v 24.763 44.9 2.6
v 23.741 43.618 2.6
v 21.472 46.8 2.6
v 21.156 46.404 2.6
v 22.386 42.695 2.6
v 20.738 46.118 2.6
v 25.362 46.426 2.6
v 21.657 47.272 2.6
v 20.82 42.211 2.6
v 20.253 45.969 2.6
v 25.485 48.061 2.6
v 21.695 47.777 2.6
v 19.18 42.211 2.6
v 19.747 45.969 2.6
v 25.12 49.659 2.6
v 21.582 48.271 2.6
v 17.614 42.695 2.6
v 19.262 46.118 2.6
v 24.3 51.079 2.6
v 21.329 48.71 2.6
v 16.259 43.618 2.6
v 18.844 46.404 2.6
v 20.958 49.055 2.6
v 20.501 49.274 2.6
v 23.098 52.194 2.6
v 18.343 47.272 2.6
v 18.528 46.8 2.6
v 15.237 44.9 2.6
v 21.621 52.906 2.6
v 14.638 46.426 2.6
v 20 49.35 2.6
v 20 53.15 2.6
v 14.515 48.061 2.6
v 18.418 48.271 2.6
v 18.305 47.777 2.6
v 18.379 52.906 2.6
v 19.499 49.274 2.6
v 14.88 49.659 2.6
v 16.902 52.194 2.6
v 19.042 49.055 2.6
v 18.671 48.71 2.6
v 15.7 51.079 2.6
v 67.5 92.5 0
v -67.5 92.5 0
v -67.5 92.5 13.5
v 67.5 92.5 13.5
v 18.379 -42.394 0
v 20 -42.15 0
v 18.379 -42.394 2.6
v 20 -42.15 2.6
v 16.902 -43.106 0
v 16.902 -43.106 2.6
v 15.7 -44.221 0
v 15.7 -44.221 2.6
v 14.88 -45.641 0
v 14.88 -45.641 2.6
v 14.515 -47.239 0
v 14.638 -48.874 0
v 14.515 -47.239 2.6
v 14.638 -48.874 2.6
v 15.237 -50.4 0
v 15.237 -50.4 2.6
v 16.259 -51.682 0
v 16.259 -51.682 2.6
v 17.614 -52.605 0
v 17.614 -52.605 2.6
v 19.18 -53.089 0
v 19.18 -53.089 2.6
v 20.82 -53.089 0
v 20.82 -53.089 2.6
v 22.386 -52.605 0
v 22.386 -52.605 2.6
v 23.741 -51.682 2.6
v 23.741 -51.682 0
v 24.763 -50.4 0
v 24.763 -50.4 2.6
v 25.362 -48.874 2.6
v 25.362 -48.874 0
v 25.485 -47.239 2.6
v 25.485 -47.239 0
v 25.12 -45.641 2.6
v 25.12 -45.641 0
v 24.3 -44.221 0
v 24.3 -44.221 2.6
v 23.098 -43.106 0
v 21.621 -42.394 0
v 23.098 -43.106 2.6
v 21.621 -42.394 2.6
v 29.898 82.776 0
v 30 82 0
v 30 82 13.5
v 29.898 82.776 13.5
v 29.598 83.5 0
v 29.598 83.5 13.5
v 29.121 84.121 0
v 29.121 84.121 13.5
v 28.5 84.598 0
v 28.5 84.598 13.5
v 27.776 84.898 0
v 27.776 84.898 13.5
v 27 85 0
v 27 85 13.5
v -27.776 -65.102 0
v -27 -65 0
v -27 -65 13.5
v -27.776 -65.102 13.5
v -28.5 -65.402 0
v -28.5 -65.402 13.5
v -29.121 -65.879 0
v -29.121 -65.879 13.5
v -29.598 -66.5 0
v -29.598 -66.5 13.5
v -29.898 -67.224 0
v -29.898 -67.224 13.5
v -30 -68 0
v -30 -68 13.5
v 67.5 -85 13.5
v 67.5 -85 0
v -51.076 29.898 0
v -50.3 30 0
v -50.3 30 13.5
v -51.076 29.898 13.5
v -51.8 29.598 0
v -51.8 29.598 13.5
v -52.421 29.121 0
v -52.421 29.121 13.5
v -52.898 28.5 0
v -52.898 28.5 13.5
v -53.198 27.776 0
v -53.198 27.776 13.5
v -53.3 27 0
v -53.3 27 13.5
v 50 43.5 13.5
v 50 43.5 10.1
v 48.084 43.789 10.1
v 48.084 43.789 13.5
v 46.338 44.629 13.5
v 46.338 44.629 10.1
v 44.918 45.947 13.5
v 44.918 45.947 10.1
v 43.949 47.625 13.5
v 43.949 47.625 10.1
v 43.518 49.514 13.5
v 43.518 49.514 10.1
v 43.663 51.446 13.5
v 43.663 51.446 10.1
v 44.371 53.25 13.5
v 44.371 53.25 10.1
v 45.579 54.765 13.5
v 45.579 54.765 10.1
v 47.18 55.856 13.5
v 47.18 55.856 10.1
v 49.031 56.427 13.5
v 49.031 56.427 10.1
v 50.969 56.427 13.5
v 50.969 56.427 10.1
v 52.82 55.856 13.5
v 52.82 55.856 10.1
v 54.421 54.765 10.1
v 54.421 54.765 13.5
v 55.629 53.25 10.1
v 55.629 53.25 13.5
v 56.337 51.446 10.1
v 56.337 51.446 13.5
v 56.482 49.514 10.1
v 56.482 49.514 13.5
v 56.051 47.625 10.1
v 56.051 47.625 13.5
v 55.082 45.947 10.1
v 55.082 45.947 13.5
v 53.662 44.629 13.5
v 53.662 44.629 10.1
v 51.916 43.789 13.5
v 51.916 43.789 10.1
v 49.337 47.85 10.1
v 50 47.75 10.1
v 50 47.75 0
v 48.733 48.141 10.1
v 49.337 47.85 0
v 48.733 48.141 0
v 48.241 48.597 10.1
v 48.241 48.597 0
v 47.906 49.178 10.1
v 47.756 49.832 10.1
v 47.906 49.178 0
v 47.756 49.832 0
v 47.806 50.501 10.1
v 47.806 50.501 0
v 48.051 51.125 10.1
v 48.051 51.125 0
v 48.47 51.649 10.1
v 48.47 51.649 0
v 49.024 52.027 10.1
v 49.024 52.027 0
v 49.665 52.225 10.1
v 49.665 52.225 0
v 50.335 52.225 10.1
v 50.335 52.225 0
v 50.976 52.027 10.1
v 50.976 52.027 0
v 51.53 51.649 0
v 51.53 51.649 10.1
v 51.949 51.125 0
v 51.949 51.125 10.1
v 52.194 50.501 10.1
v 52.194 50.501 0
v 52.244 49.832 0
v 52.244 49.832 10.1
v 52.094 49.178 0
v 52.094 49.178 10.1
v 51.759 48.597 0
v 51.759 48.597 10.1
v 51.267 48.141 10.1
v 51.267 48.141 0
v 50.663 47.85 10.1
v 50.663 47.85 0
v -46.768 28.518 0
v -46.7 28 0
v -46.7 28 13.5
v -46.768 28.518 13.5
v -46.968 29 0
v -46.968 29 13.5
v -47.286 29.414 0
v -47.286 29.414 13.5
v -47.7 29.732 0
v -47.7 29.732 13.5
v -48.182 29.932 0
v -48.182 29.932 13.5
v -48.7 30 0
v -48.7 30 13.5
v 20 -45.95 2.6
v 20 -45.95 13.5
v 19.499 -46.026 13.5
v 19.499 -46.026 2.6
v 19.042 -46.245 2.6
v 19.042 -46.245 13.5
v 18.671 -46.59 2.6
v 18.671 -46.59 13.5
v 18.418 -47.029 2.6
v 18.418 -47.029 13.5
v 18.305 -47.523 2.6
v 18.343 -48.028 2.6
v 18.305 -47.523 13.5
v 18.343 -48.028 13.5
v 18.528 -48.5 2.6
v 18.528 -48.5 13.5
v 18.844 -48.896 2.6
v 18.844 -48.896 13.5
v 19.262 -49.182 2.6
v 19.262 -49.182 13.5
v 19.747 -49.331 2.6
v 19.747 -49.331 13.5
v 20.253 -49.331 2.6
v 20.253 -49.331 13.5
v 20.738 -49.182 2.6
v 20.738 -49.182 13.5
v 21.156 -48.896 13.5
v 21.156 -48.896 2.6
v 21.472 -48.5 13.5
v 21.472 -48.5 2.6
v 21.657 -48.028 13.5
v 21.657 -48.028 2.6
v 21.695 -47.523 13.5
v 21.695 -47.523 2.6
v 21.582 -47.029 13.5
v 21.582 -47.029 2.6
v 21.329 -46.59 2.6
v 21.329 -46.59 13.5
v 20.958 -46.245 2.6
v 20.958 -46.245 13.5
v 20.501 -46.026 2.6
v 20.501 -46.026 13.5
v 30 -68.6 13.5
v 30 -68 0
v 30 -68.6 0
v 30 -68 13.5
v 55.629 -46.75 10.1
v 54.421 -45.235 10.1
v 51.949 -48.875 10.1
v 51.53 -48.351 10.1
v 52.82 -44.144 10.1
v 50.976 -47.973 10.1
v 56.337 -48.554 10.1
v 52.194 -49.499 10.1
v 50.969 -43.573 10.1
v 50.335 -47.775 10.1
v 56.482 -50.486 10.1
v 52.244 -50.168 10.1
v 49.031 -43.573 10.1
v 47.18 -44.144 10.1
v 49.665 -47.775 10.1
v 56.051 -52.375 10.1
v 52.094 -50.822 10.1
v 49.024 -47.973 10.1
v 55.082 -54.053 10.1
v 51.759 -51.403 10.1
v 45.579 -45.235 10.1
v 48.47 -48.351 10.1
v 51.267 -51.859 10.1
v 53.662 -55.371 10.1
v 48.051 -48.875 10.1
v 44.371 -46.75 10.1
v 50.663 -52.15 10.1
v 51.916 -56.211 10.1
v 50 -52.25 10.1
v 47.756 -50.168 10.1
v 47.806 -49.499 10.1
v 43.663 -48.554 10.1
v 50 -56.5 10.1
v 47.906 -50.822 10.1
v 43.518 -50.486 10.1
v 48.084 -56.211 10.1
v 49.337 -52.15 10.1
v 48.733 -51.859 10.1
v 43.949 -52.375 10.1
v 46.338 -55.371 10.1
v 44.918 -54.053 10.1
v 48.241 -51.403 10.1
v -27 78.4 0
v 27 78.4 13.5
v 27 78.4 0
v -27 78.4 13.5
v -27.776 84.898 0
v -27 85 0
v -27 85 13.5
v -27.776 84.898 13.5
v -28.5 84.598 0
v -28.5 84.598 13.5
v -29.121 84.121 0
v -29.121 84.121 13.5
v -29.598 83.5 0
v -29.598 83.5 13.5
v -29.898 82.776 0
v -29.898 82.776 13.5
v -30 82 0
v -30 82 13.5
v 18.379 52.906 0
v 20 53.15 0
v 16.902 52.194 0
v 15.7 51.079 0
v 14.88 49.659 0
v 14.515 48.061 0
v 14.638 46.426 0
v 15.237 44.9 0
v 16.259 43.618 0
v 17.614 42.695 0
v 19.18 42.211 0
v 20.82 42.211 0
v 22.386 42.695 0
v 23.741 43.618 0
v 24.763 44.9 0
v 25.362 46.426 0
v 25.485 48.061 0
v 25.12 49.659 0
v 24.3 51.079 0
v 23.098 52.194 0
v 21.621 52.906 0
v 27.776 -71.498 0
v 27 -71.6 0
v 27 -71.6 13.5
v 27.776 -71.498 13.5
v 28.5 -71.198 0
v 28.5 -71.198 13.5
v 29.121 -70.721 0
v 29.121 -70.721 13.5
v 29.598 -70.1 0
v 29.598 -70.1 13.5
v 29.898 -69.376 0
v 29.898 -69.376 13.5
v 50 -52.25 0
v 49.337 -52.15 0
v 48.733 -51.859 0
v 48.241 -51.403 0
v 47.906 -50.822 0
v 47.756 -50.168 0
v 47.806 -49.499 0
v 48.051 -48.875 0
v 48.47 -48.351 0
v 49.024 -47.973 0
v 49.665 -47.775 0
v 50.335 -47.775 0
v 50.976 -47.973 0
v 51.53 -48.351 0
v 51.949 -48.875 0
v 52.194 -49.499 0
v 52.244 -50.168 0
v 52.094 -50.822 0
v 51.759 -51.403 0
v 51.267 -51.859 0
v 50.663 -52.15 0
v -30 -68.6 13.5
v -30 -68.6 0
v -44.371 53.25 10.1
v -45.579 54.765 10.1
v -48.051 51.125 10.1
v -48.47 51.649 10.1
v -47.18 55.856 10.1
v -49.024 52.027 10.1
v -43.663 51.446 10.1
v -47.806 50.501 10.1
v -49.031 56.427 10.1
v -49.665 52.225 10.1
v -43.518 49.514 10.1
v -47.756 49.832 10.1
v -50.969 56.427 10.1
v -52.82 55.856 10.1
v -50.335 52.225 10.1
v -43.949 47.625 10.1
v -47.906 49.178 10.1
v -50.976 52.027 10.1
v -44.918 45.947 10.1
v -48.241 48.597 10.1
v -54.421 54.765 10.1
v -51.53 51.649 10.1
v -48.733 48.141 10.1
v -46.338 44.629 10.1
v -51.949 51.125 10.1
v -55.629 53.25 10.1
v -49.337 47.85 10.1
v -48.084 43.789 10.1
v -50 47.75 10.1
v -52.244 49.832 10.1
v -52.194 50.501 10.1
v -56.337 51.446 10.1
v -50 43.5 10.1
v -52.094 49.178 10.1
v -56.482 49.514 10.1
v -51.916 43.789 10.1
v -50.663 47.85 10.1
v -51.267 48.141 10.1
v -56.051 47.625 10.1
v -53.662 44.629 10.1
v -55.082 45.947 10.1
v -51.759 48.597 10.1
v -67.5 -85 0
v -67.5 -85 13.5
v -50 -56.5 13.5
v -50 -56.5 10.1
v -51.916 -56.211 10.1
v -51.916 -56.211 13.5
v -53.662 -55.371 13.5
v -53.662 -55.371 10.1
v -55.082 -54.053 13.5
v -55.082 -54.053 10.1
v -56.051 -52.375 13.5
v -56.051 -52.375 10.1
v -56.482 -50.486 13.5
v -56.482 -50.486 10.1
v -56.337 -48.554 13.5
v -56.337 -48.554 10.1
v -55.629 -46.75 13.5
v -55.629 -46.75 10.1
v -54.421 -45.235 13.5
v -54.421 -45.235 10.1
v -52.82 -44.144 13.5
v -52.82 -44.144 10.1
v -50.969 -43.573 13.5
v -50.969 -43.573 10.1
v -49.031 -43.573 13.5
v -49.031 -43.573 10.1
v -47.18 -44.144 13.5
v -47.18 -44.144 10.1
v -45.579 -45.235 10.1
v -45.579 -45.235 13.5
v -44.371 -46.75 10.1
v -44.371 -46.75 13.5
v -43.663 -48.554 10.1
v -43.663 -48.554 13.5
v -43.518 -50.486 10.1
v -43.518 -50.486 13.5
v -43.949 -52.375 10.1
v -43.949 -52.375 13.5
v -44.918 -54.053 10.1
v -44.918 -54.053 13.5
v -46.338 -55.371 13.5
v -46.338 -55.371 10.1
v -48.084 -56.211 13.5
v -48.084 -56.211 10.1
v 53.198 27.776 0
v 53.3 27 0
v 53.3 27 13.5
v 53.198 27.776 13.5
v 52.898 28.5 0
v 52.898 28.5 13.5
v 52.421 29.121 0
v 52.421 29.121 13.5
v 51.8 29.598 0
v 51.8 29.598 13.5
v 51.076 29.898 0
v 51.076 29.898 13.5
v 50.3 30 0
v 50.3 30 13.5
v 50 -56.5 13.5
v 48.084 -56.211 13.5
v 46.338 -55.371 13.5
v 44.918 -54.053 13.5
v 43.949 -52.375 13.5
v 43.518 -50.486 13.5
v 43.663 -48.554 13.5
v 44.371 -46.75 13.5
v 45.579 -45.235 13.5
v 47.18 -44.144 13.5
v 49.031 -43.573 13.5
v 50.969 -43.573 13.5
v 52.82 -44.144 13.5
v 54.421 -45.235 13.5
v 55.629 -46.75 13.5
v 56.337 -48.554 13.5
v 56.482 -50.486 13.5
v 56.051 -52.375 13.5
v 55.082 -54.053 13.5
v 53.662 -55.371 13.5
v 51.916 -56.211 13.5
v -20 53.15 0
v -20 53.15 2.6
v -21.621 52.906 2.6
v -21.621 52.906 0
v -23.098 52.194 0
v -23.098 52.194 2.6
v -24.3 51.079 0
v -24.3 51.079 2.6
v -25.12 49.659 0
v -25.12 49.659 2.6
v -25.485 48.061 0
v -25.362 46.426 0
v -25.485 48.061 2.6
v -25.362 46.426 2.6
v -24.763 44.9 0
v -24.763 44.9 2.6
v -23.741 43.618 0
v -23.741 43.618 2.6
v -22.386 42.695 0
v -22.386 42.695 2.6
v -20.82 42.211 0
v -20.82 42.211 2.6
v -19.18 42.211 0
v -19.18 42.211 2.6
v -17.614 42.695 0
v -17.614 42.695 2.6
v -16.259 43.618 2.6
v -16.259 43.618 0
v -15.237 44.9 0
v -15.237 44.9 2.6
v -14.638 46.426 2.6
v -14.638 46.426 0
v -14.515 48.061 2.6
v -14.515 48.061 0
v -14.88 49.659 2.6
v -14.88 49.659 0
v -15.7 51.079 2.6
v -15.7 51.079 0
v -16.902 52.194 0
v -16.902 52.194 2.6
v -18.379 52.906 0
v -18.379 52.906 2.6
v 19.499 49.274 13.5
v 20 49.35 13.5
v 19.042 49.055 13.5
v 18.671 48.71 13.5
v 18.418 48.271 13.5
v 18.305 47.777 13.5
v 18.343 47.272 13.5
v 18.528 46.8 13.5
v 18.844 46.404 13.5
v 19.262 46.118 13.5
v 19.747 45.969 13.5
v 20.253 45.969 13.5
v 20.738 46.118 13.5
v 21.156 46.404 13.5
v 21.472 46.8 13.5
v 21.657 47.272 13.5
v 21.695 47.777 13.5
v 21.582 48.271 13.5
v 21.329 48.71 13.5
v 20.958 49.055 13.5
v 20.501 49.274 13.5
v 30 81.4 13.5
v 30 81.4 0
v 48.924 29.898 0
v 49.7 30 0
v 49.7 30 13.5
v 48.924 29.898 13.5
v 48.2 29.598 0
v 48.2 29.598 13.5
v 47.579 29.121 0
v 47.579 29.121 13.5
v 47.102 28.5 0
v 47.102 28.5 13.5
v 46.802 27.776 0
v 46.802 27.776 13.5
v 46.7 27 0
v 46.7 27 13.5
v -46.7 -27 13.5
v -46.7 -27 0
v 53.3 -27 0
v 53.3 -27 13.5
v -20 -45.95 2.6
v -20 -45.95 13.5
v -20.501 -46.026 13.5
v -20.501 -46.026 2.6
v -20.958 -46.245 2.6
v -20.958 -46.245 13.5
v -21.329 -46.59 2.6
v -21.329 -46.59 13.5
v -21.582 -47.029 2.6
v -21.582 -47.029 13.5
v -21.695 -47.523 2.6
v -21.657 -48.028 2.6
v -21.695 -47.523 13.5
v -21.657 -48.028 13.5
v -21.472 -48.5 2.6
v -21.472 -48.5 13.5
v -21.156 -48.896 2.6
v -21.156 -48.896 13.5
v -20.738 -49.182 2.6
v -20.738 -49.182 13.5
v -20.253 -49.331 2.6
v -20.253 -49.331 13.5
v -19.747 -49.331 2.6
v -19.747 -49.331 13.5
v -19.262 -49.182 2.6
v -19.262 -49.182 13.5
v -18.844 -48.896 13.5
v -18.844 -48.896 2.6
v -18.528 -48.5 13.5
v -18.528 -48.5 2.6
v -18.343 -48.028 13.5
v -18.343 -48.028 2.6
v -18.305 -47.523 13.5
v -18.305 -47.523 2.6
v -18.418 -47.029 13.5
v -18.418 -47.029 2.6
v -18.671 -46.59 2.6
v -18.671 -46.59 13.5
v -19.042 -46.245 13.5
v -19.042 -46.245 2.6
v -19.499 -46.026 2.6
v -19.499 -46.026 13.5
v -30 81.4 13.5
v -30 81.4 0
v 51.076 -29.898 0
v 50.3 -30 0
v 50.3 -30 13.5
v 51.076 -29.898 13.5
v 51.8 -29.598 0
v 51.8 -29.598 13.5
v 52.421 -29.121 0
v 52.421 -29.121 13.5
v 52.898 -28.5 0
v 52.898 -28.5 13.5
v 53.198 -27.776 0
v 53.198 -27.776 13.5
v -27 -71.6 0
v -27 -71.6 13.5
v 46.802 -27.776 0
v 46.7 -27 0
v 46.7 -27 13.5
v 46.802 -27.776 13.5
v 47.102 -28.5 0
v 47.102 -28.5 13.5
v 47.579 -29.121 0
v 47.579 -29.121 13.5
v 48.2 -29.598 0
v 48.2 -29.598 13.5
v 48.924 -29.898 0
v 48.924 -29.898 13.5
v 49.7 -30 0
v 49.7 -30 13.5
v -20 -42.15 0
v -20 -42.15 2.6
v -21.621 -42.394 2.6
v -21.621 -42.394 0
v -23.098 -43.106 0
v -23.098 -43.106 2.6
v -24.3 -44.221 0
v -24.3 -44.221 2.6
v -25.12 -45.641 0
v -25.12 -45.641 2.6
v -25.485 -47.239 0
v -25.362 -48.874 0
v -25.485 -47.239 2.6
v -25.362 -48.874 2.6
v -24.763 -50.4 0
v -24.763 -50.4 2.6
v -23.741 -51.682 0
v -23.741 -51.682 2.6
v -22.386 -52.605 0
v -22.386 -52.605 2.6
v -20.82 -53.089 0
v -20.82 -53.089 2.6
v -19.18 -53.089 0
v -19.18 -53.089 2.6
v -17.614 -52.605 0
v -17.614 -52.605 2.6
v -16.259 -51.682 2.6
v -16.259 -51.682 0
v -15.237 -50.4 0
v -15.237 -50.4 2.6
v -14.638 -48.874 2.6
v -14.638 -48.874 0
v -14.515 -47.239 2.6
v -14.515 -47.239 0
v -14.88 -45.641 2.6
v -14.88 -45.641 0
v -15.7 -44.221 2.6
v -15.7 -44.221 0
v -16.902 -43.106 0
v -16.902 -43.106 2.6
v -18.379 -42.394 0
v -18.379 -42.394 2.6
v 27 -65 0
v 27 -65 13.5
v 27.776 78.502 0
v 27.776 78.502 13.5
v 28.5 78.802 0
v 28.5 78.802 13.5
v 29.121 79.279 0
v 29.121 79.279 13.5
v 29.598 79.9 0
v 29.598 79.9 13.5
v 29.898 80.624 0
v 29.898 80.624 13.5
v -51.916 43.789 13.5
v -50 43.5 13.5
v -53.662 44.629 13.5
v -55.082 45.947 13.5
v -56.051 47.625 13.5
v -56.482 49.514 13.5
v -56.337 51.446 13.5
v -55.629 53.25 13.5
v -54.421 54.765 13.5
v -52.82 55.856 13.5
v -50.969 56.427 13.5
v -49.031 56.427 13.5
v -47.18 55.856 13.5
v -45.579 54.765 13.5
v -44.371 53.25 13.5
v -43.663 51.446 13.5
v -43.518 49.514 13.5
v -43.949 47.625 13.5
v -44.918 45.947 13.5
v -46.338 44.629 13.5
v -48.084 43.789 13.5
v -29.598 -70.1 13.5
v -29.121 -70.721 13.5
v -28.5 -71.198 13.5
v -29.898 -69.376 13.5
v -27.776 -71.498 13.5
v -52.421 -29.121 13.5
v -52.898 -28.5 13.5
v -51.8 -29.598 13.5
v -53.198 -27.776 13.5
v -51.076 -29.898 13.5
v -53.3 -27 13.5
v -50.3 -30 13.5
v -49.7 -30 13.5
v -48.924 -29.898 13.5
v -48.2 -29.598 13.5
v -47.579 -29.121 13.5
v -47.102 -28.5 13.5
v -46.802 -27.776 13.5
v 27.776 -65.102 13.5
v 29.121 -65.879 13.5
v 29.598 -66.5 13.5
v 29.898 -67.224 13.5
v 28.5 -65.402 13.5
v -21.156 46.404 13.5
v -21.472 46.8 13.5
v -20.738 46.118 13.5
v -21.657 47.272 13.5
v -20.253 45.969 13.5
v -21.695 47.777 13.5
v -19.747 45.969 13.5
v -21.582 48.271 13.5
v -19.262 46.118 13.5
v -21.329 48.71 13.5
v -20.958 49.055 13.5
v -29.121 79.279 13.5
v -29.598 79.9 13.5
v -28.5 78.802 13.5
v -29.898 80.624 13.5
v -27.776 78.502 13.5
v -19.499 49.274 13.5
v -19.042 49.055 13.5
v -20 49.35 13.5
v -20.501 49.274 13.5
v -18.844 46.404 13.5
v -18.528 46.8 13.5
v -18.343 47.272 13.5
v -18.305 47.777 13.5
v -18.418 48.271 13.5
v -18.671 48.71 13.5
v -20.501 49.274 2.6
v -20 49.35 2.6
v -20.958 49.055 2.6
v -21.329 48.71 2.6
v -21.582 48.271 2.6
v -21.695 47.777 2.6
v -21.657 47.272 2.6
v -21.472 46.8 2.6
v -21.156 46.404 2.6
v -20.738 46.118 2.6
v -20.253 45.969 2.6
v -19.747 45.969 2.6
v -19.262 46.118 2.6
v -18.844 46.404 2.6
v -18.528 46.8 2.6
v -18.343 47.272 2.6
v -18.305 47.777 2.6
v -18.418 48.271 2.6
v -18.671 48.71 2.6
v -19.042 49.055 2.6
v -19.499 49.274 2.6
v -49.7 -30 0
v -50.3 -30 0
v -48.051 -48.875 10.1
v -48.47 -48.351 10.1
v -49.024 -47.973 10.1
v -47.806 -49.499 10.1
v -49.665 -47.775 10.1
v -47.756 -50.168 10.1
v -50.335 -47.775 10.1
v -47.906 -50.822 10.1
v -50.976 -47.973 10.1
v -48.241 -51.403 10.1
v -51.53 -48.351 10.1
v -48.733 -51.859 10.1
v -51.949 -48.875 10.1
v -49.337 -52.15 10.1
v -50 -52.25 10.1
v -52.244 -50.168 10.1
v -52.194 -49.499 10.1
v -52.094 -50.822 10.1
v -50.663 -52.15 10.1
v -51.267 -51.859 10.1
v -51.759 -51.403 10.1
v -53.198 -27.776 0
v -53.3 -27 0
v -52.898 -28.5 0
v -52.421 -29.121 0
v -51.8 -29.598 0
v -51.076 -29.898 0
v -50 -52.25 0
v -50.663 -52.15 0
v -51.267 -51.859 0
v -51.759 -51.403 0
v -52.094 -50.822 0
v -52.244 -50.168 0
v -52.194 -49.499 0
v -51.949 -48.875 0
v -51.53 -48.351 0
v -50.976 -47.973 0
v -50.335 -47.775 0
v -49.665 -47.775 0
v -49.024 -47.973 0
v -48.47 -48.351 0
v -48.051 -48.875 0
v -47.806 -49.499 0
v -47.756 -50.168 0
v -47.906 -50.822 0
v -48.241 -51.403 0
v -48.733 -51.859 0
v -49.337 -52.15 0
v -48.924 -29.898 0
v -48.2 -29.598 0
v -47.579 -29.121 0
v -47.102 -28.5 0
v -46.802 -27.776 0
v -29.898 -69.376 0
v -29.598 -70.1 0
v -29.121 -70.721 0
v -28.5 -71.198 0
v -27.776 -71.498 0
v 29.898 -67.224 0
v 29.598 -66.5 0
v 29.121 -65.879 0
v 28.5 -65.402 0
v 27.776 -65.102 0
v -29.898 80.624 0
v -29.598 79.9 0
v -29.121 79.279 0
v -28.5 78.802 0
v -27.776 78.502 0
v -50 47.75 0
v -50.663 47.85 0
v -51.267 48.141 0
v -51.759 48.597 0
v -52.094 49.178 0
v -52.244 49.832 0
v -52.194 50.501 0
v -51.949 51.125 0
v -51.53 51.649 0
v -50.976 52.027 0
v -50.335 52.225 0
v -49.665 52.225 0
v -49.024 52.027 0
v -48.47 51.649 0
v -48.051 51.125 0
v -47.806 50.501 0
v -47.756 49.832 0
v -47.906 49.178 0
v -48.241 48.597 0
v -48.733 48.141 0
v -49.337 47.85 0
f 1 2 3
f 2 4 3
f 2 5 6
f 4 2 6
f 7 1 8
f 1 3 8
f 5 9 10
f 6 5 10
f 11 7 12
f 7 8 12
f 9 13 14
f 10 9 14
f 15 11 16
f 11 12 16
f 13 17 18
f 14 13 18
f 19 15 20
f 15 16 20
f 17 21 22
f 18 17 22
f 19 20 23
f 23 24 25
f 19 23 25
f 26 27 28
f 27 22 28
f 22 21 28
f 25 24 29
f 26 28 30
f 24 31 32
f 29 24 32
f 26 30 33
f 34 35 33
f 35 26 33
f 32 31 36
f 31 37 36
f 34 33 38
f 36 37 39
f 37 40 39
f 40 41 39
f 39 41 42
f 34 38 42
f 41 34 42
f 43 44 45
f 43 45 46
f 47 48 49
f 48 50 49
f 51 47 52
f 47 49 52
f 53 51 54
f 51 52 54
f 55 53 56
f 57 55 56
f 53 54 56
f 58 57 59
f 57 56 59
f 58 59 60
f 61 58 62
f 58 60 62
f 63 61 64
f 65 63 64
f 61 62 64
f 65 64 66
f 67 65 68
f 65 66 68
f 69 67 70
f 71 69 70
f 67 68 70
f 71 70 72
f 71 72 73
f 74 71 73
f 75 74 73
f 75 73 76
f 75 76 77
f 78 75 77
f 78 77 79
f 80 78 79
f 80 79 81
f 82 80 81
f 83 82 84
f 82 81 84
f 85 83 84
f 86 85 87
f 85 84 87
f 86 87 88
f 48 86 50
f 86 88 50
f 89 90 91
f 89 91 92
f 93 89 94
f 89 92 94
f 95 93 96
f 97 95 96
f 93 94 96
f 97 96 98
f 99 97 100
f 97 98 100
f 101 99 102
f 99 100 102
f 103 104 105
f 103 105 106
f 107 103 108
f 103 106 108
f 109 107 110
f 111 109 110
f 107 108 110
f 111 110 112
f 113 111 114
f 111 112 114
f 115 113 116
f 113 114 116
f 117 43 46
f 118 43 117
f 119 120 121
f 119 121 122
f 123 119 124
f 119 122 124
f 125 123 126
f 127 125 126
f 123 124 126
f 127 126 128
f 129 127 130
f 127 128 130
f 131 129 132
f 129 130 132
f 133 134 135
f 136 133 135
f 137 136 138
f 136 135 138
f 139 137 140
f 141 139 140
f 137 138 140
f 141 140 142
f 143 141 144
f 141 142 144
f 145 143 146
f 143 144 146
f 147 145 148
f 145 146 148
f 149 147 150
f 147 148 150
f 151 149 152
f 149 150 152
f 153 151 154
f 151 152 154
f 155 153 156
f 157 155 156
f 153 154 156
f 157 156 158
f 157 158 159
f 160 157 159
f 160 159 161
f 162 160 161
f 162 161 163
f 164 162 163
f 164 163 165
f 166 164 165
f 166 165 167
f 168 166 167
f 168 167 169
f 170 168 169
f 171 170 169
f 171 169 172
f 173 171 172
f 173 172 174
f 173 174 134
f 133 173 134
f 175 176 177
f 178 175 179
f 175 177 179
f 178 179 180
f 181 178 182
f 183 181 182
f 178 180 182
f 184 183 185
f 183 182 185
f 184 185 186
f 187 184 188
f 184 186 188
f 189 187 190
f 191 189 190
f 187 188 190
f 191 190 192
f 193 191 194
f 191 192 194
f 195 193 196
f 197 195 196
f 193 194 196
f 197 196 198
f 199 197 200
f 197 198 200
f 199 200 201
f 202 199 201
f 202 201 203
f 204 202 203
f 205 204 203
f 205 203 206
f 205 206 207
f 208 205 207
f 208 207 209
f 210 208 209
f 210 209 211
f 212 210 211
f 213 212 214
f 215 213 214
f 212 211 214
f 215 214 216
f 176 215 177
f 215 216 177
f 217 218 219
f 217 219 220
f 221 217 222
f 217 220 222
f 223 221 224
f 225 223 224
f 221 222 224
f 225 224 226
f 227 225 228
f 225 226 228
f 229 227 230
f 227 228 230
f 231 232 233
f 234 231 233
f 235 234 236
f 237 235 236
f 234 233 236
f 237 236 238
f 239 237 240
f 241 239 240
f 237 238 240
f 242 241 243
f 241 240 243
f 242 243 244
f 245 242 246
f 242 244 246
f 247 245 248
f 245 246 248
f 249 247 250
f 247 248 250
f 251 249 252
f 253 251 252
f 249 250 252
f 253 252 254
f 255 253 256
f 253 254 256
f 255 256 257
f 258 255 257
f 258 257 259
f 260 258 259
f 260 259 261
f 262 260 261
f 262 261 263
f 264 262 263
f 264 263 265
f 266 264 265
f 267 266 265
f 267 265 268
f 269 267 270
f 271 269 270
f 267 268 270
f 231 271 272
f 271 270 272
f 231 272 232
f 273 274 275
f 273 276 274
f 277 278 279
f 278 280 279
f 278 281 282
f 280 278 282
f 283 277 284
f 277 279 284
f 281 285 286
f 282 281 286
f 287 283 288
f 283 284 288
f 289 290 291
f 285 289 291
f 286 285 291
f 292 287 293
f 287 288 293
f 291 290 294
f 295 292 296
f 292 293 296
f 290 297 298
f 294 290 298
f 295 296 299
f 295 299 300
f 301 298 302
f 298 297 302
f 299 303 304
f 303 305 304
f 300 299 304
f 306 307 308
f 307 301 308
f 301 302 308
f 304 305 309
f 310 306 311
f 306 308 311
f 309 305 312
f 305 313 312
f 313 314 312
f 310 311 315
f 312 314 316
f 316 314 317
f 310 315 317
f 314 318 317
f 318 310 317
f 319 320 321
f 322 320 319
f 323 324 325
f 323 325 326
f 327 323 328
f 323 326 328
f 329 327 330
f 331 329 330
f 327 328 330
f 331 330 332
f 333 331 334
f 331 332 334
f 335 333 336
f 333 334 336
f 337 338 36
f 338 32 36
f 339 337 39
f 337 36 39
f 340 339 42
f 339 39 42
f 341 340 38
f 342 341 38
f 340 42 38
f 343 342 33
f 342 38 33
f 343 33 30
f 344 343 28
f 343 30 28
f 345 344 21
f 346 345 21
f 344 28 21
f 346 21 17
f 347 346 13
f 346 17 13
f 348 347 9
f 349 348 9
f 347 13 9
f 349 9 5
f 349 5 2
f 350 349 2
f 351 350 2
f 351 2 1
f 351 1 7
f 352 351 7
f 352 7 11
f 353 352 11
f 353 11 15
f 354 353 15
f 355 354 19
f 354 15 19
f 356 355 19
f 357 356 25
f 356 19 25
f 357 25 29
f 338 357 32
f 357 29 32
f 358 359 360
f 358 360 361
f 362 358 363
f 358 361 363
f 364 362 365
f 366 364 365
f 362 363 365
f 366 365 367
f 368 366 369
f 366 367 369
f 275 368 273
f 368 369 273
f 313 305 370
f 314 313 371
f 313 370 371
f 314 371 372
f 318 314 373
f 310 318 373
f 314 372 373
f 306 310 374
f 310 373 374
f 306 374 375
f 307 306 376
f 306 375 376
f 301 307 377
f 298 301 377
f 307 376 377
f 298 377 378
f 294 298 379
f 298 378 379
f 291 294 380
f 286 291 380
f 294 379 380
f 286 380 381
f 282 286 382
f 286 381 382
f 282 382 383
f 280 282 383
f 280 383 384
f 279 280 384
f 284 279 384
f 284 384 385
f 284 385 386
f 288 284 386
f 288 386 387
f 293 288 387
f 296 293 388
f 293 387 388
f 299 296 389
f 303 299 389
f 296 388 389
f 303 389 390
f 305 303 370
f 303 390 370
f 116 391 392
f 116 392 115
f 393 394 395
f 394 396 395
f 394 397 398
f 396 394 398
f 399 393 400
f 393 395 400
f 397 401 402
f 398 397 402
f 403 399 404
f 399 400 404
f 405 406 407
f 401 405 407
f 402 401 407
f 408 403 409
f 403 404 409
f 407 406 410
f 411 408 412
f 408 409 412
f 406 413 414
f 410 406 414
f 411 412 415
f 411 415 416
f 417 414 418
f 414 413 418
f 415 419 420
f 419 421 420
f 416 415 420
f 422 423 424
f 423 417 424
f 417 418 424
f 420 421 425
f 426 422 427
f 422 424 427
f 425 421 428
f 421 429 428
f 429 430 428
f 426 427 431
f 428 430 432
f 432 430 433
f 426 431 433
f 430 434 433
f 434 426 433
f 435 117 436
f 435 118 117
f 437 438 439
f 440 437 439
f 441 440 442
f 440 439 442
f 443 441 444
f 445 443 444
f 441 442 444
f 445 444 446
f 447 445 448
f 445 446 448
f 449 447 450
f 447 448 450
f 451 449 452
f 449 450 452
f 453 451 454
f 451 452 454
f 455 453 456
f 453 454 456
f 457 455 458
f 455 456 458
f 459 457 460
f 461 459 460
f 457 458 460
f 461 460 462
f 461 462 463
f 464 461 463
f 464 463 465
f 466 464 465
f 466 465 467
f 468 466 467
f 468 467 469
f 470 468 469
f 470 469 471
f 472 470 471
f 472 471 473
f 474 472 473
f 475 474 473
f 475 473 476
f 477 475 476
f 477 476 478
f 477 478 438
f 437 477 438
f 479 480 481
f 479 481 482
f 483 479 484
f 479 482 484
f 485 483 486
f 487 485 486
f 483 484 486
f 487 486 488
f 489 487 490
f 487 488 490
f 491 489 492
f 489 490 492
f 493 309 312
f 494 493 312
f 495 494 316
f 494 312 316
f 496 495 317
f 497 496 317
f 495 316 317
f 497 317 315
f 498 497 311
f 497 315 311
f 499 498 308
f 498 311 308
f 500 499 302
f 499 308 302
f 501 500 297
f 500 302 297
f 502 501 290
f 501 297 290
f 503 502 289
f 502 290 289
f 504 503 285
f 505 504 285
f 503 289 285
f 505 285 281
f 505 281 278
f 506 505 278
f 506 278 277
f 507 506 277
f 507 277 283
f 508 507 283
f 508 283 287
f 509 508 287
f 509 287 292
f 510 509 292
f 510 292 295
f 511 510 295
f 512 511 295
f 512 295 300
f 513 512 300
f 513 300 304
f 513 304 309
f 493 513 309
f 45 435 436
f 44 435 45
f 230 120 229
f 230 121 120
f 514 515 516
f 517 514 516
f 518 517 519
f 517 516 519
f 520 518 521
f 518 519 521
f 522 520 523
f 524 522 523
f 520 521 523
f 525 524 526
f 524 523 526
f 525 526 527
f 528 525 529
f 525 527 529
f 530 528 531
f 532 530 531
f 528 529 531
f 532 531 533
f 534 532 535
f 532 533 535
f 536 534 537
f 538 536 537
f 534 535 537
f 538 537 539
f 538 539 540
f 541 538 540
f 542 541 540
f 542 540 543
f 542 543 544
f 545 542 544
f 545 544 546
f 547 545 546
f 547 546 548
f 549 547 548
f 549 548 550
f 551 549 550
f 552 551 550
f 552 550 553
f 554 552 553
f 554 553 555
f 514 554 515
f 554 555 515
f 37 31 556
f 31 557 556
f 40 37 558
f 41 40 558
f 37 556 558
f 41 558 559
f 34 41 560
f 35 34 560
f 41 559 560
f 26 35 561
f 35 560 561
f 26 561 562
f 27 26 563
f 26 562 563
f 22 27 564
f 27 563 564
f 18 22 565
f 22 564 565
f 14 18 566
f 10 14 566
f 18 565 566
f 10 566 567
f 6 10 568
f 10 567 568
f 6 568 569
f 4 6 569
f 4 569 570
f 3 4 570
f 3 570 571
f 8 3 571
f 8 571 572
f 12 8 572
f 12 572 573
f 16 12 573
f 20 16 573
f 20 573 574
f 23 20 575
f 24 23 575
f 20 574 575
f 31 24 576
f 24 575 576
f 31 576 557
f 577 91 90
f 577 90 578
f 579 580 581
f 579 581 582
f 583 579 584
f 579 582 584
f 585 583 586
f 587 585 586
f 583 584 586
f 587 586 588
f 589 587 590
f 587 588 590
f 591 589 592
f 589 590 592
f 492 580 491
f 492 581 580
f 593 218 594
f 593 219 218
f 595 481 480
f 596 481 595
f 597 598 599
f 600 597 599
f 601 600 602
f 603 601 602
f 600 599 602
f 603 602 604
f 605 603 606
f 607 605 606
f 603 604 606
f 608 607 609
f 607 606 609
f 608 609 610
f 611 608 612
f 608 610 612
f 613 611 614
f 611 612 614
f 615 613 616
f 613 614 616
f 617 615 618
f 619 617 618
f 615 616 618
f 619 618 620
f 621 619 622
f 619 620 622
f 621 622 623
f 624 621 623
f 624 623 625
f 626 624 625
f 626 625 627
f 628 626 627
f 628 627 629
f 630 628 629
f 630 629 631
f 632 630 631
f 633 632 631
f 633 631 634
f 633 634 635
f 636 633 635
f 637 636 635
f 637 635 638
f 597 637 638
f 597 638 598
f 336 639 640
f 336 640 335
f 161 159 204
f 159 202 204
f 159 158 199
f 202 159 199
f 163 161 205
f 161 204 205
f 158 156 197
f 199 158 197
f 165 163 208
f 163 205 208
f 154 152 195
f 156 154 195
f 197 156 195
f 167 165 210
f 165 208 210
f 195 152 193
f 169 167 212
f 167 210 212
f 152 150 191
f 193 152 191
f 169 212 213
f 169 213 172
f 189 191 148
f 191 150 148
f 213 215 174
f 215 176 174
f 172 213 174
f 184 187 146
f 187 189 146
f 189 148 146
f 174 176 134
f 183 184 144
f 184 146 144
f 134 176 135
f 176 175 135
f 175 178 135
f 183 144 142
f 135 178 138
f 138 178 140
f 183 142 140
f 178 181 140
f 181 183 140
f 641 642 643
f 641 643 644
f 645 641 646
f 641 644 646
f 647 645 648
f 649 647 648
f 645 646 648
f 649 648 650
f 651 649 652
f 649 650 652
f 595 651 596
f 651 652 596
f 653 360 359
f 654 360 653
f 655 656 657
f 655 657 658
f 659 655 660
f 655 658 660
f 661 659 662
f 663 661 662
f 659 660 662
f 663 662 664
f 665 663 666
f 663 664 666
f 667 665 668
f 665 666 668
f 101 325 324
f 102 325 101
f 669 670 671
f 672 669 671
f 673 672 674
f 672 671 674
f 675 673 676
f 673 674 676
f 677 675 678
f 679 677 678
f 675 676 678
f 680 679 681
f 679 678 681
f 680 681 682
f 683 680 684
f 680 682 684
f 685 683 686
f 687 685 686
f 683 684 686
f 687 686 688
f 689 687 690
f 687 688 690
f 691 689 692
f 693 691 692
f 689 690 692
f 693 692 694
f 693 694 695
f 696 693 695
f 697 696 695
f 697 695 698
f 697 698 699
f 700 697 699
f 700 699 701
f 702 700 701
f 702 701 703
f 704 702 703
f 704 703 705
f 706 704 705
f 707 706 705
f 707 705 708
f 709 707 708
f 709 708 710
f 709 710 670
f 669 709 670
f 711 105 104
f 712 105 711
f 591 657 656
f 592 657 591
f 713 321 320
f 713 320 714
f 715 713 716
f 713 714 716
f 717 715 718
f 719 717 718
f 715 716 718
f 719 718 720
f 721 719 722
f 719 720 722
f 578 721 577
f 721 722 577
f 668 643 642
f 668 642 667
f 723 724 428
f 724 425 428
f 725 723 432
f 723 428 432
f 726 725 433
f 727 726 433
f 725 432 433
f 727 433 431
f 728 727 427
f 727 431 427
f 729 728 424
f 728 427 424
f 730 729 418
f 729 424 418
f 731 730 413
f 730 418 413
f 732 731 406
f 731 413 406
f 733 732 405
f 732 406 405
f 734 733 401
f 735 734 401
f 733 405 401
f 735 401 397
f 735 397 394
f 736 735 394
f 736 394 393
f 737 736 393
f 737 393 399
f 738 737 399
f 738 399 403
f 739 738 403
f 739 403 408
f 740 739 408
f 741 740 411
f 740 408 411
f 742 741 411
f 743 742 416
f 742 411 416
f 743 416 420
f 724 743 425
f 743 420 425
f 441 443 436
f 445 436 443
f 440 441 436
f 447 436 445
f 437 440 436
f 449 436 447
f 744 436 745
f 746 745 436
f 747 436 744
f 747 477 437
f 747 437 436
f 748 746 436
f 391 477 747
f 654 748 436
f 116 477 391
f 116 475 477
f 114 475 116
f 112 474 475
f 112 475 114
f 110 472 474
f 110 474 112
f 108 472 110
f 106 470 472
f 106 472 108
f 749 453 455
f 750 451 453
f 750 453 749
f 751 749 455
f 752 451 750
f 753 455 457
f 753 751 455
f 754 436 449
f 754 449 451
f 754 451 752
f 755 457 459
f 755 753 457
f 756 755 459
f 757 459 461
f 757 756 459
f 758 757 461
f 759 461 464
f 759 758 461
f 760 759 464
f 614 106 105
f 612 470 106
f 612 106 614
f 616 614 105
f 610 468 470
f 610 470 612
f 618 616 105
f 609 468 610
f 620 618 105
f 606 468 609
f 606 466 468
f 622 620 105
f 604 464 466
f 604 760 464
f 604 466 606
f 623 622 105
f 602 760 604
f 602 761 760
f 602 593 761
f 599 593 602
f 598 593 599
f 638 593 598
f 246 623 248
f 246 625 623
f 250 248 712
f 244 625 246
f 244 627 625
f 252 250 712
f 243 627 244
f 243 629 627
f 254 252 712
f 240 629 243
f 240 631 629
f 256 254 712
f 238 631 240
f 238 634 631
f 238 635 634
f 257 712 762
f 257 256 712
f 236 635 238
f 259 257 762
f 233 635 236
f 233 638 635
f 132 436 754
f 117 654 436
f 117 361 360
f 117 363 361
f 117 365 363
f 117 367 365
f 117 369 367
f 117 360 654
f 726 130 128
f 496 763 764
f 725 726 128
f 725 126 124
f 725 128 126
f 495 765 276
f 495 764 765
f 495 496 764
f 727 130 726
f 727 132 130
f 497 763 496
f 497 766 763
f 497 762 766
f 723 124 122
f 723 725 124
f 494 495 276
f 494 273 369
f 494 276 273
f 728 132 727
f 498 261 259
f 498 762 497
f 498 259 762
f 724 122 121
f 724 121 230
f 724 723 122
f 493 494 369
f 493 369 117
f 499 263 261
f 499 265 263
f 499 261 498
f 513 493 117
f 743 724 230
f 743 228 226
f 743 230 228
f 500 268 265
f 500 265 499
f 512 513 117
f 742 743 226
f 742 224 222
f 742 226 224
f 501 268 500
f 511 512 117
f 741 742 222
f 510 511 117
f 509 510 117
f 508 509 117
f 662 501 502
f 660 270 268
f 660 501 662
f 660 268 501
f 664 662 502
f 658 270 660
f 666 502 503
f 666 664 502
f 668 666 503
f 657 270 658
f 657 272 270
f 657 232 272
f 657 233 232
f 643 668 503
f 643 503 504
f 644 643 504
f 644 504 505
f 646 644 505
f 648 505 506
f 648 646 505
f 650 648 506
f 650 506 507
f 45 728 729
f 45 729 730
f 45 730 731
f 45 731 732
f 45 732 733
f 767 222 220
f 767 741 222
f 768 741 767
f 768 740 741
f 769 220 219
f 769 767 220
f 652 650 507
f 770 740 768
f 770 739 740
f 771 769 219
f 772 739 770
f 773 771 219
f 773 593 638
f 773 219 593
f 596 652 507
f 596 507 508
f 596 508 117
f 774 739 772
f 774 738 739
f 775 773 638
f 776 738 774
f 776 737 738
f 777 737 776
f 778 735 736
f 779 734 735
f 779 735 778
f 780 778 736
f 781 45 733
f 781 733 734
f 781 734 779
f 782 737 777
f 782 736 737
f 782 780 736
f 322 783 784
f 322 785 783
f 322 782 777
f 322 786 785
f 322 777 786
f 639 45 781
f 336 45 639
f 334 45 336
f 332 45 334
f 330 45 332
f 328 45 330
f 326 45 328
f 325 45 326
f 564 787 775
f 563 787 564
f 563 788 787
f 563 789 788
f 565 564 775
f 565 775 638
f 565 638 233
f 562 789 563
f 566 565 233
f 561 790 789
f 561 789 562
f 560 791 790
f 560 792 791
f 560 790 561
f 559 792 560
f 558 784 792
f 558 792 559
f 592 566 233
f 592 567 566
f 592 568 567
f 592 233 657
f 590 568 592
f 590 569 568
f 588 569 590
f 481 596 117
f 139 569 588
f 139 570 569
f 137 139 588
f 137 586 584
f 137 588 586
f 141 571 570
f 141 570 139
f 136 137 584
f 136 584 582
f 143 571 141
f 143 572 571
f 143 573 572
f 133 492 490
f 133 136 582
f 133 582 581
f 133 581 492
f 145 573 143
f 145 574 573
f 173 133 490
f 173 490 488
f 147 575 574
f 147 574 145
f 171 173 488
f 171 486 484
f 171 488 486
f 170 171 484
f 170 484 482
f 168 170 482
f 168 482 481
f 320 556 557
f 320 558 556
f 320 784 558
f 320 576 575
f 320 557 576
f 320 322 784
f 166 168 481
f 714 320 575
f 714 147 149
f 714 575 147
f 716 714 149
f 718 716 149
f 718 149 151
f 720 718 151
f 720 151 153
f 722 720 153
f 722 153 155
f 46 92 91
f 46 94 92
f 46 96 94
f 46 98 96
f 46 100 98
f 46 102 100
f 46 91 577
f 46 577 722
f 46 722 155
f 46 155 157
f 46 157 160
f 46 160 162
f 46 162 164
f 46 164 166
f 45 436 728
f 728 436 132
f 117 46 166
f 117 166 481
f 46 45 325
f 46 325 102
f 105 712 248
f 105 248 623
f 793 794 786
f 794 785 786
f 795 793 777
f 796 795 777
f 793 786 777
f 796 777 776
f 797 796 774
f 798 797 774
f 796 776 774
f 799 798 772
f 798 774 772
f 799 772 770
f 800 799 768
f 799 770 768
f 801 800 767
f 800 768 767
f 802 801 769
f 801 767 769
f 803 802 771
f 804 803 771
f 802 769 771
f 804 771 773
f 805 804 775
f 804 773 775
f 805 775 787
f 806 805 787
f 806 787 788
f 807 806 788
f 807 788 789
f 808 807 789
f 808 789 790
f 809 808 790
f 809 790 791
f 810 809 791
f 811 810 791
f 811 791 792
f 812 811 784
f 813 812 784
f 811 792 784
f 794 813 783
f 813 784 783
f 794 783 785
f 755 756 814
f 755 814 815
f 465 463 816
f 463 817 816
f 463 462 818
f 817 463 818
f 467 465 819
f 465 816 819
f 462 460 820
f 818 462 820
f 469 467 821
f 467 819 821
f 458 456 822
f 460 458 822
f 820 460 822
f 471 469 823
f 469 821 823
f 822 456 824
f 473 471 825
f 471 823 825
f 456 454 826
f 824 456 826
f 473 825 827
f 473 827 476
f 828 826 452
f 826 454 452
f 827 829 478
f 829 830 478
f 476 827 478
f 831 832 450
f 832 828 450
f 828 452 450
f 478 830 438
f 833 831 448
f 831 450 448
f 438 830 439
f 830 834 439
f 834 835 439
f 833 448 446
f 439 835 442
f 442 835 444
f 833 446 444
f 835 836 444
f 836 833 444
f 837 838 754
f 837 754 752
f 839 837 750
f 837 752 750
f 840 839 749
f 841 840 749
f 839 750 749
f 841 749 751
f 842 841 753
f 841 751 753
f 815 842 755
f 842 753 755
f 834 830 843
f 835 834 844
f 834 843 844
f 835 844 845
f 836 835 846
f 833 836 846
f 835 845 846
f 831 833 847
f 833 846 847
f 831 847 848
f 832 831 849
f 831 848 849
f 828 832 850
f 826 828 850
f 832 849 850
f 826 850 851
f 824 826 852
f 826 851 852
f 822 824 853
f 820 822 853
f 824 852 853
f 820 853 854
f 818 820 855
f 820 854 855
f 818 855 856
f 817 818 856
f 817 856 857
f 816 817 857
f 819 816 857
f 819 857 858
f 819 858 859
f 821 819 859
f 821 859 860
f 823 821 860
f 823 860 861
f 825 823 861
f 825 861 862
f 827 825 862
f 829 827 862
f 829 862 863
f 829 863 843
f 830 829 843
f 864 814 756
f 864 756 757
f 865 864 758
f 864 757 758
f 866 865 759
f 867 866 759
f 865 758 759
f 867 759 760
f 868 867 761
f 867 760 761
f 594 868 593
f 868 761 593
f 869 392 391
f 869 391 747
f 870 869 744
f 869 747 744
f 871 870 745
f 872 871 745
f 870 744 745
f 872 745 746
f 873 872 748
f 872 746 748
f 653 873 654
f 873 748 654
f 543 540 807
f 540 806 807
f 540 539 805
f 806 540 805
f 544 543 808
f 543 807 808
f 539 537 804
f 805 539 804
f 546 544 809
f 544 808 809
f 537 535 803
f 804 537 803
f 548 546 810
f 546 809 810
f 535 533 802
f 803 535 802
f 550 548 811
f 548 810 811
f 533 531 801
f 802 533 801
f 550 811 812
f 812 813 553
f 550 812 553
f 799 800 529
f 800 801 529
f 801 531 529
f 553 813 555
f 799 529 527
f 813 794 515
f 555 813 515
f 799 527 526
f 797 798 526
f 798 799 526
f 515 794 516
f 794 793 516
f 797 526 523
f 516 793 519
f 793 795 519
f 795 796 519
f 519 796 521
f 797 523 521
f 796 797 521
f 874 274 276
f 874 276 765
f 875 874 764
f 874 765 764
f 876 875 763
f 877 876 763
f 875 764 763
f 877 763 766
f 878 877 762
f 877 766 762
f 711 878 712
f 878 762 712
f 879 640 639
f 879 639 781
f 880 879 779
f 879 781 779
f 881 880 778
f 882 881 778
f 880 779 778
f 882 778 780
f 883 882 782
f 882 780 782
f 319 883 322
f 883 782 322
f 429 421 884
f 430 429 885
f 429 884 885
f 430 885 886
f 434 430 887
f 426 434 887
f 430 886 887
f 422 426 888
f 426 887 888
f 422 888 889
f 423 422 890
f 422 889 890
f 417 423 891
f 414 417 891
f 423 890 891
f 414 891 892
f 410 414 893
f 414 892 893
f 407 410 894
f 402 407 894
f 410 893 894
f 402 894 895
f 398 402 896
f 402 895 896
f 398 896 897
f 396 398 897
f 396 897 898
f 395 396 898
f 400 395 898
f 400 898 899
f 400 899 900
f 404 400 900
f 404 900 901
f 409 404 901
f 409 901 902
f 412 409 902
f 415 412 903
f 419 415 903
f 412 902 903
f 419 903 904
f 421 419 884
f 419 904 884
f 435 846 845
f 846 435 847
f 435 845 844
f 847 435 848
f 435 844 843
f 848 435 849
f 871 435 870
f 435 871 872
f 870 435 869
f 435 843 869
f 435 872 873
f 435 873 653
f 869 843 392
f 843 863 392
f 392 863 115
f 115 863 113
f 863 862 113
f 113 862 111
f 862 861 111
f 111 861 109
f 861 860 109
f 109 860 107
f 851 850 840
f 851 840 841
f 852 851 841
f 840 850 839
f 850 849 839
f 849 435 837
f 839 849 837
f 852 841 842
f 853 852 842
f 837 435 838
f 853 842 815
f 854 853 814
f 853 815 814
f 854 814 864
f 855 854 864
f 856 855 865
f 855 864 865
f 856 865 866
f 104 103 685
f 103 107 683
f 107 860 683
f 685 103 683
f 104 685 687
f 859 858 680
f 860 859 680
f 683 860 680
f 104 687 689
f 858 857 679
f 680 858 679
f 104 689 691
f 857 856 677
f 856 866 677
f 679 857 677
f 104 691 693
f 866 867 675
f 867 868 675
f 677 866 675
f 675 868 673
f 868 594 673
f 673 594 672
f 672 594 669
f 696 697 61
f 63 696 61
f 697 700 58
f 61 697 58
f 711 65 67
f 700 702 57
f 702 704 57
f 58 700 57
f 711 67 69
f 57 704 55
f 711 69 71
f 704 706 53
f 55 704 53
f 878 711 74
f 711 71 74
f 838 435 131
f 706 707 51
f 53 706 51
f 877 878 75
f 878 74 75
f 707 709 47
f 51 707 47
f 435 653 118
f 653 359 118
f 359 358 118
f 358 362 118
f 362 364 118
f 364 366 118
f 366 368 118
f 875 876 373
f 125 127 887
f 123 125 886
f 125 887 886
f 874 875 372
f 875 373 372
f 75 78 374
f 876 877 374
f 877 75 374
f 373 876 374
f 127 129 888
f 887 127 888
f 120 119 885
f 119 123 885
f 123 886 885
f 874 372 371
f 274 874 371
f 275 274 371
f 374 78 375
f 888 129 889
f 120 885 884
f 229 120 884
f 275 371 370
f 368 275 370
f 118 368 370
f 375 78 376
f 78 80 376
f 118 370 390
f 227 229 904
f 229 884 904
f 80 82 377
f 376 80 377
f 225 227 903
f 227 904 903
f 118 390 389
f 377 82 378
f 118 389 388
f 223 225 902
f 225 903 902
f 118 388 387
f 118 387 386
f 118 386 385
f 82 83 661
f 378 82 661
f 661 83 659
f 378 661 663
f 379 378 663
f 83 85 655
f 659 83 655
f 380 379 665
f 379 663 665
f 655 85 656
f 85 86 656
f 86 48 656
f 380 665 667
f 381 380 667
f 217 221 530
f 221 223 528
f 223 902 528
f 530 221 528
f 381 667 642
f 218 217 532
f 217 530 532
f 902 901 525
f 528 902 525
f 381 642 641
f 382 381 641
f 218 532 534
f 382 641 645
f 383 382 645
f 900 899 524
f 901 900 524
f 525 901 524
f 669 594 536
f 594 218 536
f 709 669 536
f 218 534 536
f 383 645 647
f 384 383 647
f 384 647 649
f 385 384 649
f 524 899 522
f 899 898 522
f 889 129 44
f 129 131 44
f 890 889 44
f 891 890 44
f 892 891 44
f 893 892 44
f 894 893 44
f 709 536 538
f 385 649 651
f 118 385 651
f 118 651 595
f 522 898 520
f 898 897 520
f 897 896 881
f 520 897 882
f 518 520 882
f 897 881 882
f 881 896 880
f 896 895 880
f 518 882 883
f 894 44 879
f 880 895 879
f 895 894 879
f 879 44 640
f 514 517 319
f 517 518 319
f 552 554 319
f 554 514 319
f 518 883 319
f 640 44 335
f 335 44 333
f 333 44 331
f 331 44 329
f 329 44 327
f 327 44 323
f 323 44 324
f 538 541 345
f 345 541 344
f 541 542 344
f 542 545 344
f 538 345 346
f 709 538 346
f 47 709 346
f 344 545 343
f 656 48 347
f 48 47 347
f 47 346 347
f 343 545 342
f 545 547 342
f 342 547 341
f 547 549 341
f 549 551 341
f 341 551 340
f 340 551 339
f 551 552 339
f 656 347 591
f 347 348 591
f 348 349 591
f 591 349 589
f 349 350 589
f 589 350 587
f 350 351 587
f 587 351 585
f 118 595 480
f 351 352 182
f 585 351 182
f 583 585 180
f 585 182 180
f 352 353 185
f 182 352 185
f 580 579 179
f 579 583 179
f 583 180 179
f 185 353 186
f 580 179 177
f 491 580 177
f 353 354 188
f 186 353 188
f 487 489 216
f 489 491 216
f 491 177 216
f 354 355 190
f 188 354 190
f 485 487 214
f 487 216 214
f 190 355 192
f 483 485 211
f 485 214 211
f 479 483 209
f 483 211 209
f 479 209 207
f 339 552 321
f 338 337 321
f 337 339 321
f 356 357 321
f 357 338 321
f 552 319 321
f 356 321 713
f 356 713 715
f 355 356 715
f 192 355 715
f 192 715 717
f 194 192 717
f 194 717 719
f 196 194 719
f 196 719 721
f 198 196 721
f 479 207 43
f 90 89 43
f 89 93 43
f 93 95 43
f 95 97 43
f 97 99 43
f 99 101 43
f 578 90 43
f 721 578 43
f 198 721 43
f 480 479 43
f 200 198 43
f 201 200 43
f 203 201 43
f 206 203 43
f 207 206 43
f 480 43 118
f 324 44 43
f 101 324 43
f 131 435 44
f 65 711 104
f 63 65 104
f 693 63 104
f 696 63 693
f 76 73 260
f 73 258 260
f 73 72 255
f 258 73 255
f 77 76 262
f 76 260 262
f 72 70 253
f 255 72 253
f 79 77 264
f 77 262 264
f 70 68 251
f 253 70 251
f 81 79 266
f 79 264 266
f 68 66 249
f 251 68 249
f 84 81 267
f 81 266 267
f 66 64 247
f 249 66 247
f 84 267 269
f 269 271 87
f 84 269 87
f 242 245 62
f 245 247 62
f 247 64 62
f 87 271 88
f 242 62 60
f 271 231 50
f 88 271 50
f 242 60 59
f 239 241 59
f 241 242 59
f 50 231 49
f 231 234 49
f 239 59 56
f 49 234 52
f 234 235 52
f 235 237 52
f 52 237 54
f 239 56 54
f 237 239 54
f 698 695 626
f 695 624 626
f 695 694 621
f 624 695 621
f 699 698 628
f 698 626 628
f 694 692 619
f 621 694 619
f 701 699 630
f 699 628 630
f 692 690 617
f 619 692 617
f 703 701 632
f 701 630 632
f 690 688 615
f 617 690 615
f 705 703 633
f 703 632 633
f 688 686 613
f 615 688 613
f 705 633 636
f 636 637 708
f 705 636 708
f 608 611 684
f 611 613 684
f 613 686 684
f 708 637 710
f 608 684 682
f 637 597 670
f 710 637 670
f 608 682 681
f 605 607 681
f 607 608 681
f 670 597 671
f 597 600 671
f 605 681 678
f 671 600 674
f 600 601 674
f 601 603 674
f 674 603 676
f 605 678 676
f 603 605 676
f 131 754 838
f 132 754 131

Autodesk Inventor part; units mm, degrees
ref_plane "YZ Plane" through (0, 0, 0) normal (1, 0, 0) x (0, 1, 0)
ref_plane "XZ Plane" through (0, 0, 0) normal (0, 1, 0) x (-1, 0, 0)
ref_plane "XY Plane" through (0, 0, 0) normal (0, 0, 1) x (1, 0, 0)
sketch "Sketch2" plane through (0, 0, 0) normal (0, 0, 1) x (1, 0, 0)
  line L0 (-42.5, 62.5) -> (42.5, 62.5)
  line L1 (42.5, 62.5) -> (42.5, -62.5)
  line L2 (42.5, -62.5) -> (-42.5, -62.5)
  line L3 (-42.5, -62.5) -> (-42.5, 62.5)
  line L4 (-67.5, 92.5) -> (67.5, 92.5)
  line L5 (67.5, 92.5) -> (67.5, -85)
  line L6 (67.5, -85) -> (-67.5, -85)
  line L7 (-67.5, -85) -> (-67.5, 92.5)
  point P0 (0, 0)
  dimension "d16" = 125
  dimension "d17" = 62.5
  dimension "d18" = 85
  dimension "d19" = 42.5
  dimension "d20" = 25
  dimension "d21" = 25
  dimension "d23" = 22.5
  dimension "d75" = 30
extrude "flash4base" add sketch "Sketch2" along normal blind 13.5 contours L0 L1 L2 L3 | L4 L5 L6 L7
sketch "Sketch3" plane through (0, 0, 0) normal (0, 0, -1) x (-1, 0, 0)
  point P0 (0, 0)
  point P1 (-20, 47.65)
  point P2 (20, 47.65)
  point P3 (-20, -47.65)
  point P4 (20, -47.65)
  dimension "d26" = 40
  dimension "d27" = 20
  dimension "d28" = 95.3
  dimension "d29" = 47.65
hole "flash4mountingholes" at (20, 47.65, 0) at (-20, 47.65, 0) at (20, -47.65, 0) at (-20, -47.65, 0) direction (0, 0, 1) diameter 3.4 end through all counterbore diameter 11 counterbore depth 2.6 clearance for "Hex Head Cap Screw ISO 24017" size "M3" standard "ISO"
sketch "Sketch4" plane through (0, 0, 13.5) normal (0, 0, 1) x (1, 0, 0)
  point P0 (0, 0)
  point P1 (50, -50)
  point P2 (-50, -50)
  point P3 (50, 50)
  point P4 (-50, 50)
  dimension "d37" = 100
  dimension "d38" = 50
  dimension "d39" = 100
  dimension "d56" = 50
hole "mountinPostMountingHoles" at (50, -50, 13.5) at (-50, -50, 13.5) at (50, 50, 13.5) at (-50, 50, 13.5) direction (0, 0, -1) diameter 4.5 end through all counterbore diameter 13 counterbore depth 3.4 clearance for "Hex Head Cap Screw ISO 24017" size "M4" standard "ISO"
sketch "Sketch5" plane through (0, 0, 13.5) normal (0, 0, 1) x (1, 0, 0)
  line L0 (-50.3, 30) -> (-48.7, 30)
  line L1 (-46.7, 28) -> (-46.7, -27)
  line L2 (-49.7, -30) -> (-50.3, -30)
  line L3 (-53.3, -27) -> (-53.3, 27)
  line L4 (49.7, 30) -> (50.3, 30)
  line L5 (53.3, 27) -> (53.3, -27)
  line L6 (50.3, -30) -> (49.7, -30)
  line L7 (46.7, -27) -> (46.7, 27)
  arc A0 (-46.7, 28) -> (-48.7, 30) centre (-48.7, 28) ccw
  arc A1 (-50.3, 30) -> (-53.3, 27) centre (-50.3, 27) ccw
  arc A2 (-53.3, -27) -> (-50.3, -30) centre (-50.3, -27) ccw
  arc A3 (-49.7, -30) -> (-46.7, -27) centre (-49.7, -27) ccw
  arc A4 (46.7, -27) -> (49.7, -30) centre (49.7, -27) ccw
  arc A5 (50.3, -30) -> (53.3, -27) centre (50.3, -27) ccw
  arc A6 (49.7, 30) -> (46.7, 27) centre (49.7, 27) ccw
  arc A7 (53.3, 27) -> (50.3, 30) centre (50.3, 27) ccw
  line L8 (-27, 85) -> (27, 85)
  line L9 (30, 82) -> (30, 81.4)
  line L10 (27, 78.4) -> (-27, 78.4)
  line L11 (-30, 81.4) -> (-30, 82)
  line L12 (-27, -65) -> (27, -65)
  line L13 (30, -68) -> (30, -68.6)
  line L14 (27, -71.6) -> (-27, -71.6)
  line L15 (-30, -68.6) -> (-30, -68)
  arc A8 (-27, 85) -> (-30, 82) centre (-27, 82) ccw
  arc A9 (-30, 81.4) -> (-27, 78.4) centre (-27, 81.4) ccw
  arc A10 (30, 82) -> (27, 85) centre (27, 82) ccw
  arc A11 (27, 78.4) -> (30, 81.4) centre (27, 81.4) ccw
  arc A12 (-27, -65) -> (-30, -68) centre (-27, -68) ccw
  arc A13 (-30, -68.6) -> (-27, -71.6) centre (-27, -68.6) ccw
  arc A14 (30, -68) -> (27, -65) centre (27, -68) ccw
  arc A15 (27, -71.6) -> (30, -68.6) centre (27, -68.6) ccw
  point P0 (0, 0)
  point P1 (46.7, 30)
  point P2 (53.3, 30)
  point P3 (-30, -71.6)
  dimension "d48" = 6.6
  dimension "d50" = 6.6
  dimension "d52" = 30
  dimension "d53" = 30
  dimension "d54" = 30
  dimension "d55" = 30
  dimension "d57" = 2
  dimension "d58" = 3
  dimension "d59" = 3
  dimension "d62" = 6.6
  dimension "d63" = 6.6
  dimension "d64" = 30
  dimension "d65" = 30
  dimension "d66" = 30
  dimension "d67" = 30
  dimension "d70" = 3
  dimension "d71" = 93.4
  dimension "d72" = 46.7
  dimension "d73" = 143.4
  dimension "d74" = 65
extrude "m6Alignment" cut sketch "Sketch5" against normal through all
equation "\"d17\" = 0.5 * d16"
equation "\"d19\" = 0.5 * d18"
equation "\"d27\" = 0.5 * d26"
equation "\"d29\" = 0.5 * d28"
equation "\"d38\" = 0.5 * d37"
equation "\"d56\" = 0.5 * d39"
equation "\"d53\" = d52"
equation "\"d54\" = d52"
equation "\"d55\" = d54"
equation "\"d62\" = d50"
equation "\"d63\" = d50"
equation "\"d64\" = d52"
equation "\"d65\" = d64"
equation "\"d66\" = d65"
equation "\"d67\" = d64"
equation "\"d72\" = 0.5 * d71"
equation "\"d10\" = 125"
equation "\"d11\" = 7"
equation "\"d12\" = 4"
properties part number "sCMOSmountingBase"
